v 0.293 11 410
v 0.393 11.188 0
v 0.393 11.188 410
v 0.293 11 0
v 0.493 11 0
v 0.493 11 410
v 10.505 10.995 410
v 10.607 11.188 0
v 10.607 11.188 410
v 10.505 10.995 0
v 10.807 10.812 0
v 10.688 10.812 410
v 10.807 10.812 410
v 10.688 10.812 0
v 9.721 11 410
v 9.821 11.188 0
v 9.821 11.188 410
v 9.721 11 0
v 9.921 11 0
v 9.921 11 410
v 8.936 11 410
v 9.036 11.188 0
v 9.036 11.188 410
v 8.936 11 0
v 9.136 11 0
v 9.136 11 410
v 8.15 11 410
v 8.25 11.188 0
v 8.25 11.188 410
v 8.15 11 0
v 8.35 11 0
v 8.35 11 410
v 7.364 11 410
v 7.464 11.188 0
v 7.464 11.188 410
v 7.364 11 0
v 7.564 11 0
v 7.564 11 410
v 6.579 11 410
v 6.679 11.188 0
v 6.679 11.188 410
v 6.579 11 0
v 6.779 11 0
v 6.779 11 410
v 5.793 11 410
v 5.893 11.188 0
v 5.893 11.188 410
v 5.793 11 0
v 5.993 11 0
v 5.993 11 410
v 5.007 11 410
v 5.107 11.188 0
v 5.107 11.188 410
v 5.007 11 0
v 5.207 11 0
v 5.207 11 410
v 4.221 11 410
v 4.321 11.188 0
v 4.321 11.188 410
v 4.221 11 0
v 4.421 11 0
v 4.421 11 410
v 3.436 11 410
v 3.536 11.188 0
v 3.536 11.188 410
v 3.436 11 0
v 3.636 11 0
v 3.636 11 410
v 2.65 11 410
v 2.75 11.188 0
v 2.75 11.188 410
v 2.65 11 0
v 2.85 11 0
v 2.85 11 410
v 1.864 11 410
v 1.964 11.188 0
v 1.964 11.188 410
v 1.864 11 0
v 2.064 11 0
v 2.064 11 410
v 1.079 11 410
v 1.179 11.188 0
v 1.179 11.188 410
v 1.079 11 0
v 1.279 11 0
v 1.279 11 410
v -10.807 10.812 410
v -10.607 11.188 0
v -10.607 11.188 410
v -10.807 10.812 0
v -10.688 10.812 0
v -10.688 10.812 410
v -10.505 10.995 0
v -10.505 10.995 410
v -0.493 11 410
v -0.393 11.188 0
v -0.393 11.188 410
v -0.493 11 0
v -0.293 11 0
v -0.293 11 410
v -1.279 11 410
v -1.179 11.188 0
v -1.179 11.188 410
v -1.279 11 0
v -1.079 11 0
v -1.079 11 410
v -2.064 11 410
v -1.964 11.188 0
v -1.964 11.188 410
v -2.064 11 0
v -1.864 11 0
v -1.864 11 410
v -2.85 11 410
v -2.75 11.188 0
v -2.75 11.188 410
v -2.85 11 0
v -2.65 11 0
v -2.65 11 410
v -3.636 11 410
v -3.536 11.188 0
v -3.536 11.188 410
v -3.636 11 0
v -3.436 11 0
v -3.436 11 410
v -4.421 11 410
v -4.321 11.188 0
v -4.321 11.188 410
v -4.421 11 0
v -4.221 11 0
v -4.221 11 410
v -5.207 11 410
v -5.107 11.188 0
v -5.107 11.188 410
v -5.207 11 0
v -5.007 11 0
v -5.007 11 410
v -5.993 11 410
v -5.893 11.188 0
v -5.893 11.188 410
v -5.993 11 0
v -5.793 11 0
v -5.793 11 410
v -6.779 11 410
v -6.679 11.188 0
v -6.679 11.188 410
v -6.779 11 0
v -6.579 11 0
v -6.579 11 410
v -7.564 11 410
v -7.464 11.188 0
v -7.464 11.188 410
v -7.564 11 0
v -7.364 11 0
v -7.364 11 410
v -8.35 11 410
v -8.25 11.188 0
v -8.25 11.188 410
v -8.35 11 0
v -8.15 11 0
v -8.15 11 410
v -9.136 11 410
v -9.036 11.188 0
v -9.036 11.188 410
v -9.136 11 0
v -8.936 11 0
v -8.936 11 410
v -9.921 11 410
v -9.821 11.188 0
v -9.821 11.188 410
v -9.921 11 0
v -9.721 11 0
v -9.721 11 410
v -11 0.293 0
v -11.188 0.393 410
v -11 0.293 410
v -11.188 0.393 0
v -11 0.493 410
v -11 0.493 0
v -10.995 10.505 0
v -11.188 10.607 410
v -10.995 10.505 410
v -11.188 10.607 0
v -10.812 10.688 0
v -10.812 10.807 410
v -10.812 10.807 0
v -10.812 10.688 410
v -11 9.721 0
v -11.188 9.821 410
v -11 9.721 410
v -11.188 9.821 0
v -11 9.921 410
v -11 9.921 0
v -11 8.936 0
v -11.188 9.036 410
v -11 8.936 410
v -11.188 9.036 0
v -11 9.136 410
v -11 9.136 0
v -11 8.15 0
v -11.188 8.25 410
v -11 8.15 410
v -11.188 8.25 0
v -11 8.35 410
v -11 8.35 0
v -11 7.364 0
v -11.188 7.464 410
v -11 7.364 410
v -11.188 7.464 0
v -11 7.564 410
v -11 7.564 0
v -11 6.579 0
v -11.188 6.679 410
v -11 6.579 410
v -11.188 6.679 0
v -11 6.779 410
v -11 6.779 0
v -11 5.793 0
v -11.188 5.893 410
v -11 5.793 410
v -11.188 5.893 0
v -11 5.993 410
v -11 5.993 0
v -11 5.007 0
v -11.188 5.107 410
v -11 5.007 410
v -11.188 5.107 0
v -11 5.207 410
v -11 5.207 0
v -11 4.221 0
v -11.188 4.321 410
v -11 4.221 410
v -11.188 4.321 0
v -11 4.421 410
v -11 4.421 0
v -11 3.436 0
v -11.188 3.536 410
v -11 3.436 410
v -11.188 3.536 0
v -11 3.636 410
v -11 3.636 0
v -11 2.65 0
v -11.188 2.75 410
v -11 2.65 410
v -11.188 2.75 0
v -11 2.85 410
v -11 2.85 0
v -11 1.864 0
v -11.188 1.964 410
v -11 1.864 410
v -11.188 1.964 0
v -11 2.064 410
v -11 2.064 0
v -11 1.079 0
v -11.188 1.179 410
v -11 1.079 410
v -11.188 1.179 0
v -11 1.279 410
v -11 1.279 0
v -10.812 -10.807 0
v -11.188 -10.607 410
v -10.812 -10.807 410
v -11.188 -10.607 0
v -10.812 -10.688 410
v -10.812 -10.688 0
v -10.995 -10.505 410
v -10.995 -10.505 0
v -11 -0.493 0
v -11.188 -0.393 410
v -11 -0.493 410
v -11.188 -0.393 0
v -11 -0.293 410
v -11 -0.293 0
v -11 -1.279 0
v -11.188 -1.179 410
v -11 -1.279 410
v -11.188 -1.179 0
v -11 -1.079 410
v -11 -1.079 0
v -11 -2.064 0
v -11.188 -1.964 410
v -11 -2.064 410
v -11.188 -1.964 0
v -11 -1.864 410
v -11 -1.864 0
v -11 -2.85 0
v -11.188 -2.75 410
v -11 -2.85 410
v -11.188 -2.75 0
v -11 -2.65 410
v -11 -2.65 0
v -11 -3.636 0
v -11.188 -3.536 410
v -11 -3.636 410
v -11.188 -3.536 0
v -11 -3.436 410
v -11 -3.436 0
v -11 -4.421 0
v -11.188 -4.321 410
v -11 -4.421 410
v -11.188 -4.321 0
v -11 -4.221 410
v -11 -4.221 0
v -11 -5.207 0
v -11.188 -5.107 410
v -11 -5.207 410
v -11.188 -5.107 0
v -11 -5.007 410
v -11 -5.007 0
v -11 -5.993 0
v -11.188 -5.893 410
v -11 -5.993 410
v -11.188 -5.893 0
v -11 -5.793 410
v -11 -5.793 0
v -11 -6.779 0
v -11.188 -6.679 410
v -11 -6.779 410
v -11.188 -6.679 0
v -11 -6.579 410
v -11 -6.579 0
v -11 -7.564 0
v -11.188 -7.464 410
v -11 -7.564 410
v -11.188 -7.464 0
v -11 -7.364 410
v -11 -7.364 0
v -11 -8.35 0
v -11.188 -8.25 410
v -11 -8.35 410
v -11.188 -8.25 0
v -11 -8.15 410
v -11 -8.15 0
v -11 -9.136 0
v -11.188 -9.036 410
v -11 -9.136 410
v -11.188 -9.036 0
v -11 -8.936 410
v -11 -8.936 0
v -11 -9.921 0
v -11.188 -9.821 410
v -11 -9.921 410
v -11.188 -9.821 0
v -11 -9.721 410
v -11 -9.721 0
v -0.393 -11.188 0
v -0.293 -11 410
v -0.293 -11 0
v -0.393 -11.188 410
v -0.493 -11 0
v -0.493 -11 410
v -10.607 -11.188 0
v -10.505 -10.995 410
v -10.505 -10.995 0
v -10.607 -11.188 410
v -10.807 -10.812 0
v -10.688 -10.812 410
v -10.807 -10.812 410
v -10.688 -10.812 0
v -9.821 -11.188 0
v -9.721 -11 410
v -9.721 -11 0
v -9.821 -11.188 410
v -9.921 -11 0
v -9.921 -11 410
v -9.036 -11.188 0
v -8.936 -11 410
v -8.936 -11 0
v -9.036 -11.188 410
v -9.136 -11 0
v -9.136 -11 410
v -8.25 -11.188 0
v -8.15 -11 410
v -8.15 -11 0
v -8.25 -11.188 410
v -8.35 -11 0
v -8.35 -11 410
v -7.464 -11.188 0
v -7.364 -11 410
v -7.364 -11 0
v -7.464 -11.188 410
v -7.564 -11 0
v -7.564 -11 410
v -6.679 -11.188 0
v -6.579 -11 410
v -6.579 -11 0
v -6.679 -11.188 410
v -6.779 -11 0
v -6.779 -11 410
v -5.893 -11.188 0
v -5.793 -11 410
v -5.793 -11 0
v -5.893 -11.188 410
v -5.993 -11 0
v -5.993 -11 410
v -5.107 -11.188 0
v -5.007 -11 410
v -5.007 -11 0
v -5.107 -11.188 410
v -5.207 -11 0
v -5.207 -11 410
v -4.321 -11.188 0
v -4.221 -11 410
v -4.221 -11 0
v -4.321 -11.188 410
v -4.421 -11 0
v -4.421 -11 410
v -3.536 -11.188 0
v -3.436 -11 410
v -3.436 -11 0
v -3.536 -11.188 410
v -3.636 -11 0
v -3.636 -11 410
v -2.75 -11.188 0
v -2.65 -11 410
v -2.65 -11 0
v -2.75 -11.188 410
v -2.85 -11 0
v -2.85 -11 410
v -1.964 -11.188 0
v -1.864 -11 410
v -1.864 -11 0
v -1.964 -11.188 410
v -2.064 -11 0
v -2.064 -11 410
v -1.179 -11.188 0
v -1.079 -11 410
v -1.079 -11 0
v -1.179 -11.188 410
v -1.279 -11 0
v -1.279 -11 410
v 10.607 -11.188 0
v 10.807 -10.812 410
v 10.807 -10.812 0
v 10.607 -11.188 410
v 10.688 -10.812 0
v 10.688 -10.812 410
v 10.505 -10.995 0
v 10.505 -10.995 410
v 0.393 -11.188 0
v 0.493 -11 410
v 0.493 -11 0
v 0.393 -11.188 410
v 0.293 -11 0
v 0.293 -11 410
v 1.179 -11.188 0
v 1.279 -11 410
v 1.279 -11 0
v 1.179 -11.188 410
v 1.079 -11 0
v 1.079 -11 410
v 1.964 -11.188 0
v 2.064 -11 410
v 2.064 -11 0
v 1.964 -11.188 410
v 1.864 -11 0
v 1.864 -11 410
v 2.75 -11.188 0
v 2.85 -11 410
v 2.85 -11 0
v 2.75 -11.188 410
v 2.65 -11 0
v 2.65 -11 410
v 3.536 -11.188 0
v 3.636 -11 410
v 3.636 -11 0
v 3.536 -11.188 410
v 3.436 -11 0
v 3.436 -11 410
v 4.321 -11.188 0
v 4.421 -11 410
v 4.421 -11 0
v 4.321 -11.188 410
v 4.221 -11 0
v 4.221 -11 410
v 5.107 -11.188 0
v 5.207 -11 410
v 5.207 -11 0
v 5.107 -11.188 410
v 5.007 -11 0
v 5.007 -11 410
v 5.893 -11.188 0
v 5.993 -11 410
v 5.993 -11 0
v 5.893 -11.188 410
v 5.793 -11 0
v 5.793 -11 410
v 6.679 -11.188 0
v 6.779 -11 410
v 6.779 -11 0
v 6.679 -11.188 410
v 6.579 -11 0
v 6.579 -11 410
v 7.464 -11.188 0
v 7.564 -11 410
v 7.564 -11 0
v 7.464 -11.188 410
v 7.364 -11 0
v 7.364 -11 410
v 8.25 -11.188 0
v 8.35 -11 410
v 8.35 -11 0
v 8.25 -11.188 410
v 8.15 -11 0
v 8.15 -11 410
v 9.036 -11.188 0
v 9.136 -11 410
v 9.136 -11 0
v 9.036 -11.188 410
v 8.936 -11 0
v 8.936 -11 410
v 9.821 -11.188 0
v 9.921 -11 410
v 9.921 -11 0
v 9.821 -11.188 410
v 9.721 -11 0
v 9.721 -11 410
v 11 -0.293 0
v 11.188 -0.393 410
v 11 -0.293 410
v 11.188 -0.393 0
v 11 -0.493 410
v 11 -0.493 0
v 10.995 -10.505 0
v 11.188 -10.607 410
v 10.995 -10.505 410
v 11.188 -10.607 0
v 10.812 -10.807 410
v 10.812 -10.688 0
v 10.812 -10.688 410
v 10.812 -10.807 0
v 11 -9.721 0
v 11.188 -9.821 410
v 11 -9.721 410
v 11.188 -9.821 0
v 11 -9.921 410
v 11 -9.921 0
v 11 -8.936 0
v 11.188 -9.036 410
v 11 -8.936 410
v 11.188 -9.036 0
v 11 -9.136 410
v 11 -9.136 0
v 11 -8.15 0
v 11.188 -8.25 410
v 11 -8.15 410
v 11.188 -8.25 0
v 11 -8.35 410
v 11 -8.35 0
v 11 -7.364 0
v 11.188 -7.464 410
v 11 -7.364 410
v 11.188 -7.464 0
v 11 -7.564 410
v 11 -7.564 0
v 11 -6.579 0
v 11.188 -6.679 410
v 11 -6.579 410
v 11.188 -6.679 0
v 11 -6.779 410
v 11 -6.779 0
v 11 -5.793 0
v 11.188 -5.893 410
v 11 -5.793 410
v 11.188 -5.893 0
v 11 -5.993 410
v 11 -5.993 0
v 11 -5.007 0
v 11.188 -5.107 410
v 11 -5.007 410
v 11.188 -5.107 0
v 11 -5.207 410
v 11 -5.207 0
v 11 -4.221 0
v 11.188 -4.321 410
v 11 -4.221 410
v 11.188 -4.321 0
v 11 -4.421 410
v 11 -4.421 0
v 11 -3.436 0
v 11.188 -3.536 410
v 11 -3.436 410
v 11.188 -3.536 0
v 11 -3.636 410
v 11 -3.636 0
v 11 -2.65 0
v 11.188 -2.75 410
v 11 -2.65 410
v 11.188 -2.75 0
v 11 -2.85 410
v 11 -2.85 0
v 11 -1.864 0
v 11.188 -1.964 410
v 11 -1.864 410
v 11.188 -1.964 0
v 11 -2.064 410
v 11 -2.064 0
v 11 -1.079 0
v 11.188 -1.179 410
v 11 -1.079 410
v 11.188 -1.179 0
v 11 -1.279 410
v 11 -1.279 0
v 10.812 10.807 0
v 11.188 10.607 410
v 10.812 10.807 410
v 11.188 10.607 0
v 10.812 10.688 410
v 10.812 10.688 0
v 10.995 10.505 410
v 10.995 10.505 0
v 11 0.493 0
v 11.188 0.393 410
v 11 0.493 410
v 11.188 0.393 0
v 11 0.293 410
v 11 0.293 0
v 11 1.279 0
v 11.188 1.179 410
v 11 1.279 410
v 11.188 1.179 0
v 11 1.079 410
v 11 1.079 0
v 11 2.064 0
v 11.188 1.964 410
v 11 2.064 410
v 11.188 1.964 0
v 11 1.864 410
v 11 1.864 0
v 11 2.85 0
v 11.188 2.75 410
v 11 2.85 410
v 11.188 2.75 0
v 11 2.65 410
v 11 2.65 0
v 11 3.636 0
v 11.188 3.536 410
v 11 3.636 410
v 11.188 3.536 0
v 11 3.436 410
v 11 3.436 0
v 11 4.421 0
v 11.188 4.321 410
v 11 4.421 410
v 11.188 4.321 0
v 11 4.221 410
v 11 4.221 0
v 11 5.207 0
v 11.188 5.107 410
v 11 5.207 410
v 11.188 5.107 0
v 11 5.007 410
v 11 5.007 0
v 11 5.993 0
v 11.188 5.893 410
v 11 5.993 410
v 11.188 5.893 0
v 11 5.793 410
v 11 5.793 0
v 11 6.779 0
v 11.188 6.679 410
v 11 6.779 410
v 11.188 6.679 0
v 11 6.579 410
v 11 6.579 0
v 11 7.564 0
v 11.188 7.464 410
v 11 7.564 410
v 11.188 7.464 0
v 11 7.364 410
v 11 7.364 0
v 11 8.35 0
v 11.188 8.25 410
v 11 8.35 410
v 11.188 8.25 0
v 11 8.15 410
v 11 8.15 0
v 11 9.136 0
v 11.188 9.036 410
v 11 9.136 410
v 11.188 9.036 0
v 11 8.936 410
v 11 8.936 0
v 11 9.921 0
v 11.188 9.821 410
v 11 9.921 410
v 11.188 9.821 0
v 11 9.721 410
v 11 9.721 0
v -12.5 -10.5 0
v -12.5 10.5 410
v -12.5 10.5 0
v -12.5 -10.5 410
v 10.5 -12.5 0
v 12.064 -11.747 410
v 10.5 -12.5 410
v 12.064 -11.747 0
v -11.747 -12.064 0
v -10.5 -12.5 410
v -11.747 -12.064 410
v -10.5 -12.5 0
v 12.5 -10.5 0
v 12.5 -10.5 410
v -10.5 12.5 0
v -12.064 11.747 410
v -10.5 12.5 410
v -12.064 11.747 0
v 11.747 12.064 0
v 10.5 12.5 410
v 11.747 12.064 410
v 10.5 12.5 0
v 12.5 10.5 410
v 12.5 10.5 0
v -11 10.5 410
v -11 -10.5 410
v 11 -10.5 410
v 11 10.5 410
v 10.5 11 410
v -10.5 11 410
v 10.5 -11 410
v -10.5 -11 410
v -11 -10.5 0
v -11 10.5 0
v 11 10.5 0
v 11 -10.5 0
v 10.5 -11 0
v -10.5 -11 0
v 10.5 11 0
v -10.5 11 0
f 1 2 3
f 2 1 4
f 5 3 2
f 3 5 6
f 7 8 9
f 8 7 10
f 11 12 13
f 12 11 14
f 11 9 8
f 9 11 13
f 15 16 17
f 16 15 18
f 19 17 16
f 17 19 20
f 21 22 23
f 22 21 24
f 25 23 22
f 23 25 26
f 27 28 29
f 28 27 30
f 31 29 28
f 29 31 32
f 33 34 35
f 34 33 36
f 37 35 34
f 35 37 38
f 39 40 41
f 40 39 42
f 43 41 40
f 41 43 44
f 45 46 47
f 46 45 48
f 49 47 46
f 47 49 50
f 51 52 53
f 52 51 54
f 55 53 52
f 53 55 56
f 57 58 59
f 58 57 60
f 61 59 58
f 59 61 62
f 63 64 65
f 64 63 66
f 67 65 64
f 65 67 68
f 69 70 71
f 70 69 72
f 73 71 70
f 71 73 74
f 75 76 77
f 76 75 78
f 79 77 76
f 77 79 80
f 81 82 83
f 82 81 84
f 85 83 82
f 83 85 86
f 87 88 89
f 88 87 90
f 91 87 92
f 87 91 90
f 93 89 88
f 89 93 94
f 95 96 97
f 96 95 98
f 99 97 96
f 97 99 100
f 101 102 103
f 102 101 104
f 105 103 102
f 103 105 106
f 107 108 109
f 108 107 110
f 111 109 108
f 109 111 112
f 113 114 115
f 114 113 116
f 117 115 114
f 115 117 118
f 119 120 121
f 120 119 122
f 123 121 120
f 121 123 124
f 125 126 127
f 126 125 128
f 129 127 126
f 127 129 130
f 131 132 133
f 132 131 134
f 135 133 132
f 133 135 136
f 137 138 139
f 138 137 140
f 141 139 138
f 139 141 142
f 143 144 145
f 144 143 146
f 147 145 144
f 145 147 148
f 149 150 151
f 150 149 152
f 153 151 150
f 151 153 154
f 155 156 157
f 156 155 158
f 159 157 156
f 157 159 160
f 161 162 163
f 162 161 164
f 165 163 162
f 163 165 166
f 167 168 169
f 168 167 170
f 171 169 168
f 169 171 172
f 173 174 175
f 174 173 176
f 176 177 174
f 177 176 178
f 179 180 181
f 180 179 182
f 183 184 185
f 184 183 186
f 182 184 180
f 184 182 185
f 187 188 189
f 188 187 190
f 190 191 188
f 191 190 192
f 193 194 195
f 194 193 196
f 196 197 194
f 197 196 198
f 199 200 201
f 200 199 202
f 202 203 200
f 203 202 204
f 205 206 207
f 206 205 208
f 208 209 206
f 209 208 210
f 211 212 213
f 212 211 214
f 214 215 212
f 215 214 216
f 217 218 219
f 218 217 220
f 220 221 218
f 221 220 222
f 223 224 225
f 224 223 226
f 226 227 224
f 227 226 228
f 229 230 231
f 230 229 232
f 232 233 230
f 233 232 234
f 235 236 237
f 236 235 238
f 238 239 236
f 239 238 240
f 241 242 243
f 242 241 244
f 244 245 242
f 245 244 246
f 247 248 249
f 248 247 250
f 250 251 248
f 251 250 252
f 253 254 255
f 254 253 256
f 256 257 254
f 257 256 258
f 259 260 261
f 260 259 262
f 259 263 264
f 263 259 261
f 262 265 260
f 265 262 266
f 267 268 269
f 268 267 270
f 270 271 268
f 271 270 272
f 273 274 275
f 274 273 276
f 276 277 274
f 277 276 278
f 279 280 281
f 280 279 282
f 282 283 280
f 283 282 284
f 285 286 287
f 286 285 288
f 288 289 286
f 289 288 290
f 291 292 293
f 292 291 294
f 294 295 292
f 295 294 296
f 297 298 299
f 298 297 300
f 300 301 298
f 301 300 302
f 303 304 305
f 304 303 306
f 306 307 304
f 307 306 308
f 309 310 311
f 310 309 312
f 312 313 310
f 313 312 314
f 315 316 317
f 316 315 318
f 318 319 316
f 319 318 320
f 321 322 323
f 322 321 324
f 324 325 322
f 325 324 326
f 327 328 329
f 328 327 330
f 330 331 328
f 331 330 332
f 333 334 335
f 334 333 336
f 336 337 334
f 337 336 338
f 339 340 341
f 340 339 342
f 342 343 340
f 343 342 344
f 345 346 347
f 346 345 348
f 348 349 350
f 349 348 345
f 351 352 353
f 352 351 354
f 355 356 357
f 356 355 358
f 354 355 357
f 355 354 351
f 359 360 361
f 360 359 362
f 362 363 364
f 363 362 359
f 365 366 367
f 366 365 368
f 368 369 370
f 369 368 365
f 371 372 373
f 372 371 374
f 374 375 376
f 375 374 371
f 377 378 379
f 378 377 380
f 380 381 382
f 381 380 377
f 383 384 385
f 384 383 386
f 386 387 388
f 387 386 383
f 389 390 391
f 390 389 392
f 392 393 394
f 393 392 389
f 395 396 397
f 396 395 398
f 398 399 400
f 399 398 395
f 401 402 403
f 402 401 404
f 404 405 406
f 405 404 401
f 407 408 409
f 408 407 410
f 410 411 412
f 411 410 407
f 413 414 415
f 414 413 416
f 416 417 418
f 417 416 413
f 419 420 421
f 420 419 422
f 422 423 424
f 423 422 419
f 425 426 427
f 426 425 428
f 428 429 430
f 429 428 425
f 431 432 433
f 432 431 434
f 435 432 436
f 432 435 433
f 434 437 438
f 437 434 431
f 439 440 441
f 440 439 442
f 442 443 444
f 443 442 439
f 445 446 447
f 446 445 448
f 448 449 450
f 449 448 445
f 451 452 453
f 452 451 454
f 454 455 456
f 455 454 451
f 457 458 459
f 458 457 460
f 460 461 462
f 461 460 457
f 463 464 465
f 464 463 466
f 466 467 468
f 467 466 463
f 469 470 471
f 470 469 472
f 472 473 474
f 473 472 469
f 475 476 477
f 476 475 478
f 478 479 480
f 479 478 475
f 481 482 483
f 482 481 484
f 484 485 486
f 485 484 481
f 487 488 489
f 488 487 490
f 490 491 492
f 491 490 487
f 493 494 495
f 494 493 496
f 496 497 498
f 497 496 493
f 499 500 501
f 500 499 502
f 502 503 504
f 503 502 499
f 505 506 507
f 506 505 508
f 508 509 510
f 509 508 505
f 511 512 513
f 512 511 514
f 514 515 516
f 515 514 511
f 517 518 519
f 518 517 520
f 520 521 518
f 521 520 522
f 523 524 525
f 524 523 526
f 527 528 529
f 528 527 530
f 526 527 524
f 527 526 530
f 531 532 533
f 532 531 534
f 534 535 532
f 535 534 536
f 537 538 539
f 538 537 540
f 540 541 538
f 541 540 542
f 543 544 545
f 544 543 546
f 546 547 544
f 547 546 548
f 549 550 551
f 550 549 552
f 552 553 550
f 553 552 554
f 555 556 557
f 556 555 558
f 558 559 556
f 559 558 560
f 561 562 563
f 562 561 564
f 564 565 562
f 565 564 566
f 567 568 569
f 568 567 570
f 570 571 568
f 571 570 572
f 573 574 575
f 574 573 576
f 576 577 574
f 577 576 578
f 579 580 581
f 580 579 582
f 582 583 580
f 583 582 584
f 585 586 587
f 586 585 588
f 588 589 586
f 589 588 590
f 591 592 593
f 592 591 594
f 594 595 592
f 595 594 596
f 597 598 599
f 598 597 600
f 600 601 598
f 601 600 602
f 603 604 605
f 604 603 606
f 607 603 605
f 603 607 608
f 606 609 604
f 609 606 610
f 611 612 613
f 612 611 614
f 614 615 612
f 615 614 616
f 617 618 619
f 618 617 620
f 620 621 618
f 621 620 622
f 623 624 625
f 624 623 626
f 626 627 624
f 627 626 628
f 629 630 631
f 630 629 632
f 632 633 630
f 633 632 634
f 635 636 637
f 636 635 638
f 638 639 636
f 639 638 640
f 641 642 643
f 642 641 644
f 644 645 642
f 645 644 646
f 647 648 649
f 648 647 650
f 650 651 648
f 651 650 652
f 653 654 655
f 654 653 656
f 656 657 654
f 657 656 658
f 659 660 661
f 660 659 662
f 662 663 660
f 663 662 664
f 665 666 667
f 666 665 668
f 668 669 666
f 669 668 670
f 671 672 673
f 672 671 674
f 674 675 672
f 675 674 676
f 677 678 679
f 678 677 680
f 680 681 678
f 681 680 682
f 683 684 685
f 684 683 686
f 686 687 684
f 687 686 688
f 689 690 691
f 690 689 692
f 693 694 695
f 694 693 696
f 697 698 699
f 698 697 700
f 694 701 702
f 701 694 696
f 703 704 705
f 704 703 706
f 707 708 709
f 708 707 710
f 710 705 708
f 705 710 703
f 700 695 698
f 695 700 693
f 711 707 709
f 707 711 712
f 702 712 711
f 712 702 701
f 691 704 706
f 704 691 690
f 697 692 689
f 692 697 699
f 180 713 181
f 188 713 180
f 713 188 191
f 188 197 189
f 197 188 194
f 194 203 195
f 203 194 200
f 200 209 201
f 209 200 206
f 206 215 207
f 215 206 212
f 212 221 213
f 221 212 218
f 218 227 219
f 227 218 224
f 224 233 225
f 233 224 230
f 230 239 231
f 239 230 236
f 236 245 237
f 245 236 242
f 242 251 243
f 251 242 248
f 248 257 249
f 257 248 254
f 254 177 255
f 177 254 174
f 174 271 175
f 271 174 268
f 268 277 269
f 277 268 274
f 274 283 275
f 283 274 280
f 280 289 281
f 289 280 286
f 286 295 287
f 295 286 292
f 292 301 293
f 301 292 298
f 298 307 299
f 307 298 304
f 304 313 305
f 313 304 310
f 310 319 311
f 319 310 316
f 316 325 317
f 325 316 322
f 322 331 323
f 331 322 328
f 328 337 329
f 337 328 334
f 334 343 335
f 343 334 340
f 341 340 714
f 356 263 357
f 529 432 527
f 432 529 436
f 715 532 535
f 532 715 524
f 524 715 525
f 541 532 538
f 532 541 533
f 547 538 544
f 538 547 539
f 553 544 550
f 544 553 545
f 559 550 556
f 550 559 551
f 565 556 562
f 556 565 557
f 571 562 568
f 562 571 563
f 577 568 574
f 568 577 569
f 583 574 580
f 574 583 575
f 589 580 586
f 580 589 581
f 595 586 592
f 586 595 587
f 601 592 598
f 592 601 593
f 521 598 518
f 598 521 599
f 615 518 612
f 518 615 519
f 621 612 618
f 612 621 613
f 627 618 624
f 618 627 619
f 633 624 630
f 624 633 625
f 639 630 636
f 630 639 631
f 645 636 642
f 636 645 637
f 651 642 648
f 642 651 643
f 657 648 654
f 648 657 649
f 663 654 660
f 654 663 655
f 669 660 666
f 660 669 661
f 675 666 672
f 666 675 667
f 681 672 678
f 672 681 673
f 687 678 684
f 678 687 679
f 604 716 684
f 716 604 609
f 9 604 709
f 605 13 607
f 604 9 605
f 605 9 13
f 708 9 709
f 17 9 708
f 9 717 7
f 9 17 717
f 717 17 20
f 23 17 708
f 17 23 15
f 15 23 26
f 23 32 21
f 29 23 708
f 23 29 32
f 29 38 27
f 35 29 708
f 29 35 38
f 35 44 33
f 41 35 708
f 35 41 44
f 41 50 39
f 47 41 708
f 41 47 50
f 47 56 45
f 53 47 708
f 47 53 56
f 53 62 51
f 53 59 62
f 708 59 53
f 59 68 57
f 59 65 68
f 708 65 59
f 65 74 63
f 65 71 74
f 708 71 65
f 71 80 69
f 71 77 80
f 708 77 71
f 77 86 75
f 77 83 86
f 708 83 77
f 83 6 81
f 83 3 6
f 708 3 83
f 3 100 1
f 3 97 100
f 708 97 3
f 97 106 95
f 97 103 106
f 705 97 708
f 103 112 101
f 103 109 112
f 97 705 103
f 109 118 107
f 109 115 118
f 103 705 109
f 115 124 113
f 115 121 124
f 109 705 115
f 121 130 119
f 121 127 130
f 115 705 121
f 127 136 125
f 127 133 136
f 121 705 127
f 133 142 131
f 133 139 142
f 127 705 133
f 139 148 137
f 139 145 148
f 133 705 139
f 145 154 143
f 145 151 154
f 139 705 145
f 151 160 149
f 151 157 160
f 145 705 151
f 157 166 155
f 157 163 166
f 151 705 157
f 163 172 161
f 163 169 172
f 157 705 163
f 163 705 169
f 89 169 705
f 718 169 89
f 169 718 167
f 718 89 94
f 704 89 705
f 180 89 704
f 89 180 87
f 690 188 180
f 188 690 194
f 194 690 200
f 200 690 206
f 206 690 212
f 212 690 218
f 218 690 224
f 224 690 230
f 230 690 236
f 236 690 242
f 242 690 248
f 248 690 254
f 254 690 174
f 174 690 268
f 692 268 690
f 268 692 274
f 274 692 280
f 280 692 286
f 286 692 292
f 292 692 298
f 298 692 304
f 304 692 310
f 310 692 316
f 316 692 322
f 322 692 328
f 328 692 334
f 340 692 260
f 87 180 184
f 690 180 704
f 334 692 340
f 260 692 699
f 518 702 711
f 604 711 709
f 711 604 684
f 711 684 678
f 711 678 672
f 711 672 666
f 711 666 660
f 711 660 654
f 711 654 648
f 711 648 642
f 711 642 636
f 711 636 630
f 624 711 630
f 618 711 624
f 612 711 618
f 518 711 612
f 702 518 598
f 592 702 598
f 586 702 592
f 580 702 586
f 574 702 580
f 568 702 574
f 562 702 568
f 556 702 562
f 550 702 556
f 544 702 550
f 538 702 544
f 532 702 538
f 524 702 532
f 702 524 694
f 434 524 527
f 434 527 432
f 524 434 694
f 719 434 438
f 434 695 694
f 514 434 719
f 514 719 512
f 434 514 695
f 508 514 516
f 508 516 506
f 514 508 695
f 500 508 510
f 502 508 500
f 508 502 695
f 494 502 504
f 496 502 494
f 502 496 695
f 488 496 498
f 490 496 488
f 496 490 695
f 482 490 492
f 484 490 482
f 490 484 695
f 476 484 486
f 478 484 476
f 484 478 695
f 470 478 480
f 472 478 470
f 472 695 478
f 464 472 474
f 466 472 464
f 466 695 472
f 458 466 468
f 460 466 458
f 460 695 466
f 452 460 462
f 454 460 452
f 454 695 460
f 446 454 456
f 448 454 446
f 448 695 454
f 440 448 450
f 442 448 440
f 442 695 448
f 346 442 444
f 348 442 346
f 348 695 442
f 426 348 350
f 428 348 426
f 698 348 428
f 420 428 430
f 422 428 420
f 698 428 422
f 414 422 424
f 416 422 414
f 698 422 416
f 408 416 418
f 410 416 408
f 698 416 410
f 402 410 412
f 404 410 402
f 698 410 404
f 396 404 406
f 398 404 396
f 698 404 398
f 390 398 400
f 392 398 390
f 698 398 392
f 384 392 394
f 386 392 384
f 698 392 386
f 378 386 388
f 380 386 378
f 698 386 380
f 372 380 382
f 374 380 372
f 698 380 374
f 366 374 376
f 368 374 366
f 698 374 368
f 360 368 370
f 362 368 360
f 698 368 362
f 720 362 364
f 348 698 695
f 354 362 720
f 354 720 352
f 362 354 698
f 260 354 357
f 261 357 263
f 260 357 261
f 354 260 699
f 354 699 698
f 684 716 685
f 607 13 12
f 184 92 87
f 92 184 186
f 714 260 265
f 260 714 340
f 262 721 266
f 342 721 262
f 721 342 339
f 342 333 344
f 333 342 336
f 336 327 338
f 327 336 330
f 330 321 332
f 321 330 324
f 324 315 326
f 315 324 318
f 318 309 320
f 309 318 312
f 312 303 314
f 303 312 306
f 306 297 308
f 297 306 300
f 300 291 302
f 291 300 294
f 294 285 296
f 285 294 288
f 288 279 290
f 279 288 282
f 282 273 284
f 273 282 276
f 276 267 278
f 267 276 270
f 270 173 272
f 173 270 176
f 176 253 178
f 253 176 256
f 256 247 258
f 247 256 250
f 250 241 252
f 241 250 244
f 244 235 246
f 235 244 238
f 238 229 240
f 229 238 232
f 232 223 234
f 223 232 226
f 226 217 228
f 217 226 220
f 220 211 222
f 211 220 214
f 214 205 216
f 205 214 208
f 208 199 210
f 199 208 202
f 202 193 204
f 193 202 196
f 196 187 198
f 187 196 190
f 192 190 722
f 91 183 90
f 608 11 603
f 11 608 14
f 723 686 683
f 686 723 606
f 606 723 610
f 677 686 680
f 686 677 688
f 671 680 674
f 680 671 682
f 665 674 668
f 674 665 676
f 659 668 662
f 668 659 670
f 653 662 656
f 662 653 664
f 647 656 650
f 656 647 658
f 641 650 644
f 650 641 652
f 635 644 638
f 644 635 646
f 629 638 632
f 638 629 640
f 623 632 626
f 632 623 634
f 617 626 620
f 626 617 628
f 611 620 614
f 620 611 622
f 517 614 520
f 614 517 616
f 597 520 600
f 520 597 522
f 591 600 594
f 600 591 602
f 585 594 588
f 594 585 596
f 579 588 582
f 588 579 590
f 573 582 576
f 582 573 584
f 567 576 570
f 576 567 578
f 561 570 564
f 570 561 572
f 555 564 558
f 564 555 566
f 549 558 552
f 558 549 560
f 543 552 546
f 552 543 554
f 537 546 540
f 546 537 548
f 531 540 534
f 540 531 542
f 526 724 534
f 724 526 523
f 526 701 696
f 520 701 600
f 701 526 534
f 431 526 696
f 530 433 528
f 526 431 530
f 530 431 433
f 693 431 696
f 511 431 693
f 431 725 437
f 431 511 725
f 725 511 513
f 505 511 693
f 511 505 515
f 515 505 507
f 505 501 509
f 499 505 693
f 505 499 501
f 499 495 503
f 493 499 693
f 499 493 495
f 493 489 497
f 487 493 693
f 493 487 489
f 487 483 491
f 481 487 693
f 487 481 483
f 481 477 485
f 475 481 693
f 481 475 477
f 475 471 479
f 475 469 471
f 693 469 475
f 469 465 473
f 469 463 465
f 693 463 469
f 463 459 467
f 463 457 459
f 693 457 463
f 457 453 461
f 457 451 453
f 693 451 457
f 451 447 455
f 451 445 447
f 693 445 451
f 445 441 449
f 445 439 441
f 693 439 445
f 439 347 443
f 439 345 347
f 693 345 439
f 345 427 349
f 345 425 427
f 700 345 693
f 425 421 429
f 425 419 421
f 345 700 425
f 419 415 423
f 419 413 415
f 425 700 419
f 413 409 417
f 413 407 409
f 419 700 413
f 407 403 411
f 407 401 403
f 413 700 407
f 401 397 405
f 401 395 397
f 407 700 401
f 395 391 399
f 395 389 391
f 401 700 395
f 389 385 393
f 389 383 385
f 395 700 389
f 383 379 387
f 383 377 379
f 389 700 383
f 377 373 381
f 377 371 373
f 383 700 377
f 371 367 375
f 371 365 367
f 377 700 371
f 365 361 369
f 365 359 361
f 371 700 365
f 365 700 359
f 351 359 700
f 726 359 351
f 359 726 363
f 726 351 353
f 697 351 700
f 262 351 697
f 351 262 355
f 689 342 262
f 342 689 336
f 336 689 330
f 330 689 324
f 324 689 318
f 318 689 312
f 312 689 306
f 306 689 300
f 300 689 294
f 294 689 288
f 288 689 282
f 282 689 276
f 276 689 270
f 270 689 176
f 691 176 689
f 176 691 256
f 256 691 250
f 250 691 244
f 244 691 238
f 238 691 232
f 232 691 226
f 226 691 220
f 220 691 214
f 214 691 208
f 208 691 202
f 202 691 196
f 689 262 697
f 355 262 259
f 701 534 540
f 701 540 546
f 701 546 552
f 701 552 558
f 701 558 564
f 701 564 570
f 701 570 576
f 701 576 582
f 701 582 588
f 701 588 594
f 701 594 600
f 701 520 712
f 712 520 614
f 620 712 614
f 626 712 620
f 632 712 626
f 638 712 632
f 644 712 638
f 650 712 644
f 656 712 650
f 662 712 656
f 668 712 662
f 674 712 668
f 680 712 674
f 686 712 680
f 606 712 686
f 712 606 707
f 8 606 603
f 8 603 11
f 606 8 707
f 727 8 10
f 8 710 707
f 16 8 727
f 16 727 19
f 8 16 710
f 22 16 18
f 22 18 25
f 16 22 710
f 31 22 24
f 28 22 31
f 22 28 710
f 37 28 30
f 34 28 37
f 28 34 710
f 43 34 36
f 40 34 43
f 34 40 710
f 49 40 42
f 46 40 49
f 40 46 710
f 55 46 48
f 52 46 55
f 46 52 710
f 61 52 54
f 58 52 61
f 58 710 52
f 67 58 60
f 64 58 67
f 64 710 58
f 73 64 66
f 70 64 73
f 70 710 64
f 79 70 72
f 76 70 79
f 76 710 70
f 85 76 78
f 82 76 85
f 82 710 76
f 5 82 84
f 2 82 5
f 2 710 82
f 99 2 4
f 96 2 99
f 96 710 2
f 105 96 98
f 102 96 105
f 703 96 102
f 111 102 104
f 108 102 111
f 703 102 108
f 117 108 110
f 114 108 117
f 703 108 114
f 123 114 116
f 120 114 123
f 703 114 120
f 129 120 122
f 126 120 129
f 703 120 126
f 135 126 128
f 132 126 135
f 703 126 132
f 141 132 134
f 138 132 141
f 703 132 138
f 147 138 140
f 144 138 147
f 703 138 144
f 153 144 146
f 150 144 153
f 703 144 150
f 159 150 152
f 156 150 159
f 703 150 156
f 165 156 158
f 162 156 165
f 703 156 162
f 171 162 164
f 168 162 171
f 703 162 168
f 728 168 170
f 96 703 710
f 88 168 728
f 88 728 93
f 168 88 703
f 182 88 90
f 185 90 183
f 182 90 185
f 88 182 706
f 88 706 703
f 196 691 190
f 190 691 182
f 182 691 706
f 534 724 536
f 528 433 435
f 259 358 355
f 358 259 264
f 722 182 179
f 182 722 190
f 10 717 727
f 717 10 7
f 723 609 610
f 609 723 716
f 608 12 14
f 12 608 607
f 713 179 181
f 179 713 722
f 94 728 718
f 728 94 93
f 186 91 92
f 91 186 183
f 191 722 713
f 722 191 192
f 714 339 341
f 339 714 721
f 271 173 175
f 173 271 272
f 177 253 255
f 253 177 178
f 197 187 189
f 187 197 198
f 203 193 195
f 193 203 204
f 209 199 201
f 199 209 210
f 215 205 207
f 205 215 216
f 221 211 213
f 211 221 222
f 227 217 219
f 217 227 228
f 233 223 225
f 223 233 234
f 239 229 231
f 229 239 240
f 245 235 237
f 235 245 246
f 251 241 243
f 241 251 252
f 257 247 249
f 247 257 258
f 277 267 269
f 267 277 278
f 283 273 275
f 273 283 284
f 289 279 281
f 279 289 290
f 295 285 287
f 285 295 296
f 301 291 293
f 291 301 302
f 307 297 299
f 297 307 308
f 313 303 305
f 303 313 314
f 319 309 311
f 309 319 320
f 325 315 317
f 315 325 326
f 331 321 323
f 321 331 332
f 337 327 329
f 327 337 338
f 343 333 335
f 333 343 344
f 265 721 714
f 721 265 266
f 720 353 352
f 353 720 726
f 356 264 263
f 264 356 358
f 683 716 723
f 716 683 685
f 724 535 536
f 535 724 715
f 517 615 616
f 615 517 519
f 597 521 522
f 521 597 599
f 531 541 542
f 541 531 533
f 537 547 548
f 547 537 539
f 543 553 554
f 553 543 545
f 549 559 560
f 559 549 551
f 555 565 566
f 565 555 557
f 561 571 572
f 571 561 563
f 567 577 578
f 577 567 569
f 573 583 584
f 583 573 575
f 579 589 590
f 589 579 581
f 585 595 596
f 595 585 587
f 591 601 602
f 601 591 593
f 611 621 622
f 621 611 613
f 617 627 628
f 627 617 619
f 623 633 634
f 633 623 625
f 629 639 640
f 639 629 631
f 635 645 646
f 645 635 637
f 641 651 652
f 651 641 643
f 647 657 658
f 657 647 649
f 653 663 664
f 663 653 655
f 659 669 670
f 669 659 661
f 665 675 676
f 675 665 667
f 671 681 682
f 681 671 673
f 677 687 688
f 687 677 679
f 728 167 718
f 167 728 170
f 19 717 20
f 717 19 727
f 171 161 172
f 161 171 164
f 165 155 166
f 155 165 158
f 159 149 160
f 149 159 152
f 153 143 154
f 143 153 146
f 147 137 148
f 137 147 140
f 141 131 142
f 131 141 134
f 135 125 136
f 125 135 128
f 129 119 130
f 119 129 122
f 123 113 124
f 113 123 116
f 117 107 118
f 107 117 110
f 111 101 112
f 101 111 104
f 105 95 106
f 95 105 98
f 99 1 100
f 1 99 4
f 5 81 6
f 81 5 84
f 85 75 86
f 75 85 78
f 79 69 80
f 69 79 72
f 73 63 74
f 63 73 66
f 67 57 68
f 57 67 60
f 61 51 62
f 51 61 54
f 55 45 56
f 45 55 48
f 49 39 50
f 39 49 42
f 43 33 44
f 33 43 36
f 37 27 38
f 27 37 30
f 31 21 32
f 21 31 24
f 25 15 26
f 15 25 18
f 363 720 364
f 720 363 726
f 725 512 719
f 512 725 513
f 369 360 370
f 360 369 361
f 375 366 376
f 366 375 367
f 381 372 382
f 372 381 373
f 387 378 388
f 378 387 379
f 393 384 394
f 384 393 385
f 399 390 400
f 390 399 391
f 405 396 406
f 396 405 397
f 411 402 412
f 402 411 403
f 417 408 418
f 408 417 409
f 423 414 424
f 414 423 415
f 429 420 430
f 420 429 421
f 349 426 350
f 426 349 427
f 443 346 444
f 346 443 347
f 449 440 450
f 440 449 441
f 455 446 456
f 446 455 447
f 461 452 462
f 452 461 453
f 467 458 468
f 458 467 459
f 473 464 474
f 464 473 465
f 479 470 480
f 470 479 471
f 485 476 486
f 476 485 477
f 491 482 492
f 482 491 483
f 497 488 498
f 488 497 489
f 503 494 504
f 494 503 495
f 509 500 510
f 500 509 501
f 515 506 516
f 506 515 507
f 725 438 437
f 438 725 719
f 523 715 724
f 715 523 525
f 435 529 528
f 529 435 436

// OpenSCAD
// ============================================================
//  ALUSTECK® Komplettbibliothek – 25 × 25 mm System
//
//  Teile:
//    0  vierkantrohr()           – Rohr (Länge frei wählbar)
//    1  rechter_winkel()         – L-Form,  2 Zapfen (2D)
//    2  t_stueck()               – T-Form,  3 Zapfen (2D)
//    3  kreuz()                  – +-Form,  4 Zapfen (2D)
//    4  rechter_winkel_abgang()  – 3D-Ecke, 3 Zapfen
//    5  t_verbinder_abgang()     – 3D-T+1,  4 Zapfen
//    6  kreuz_abgang()           – Kreuz+1, 5 Zapfen (3D)
//    7  stern()                  – Alle 6 Seiten, 6 Zapfen (3D)
//    8  rohrverlaengerung()      – Gerade Verlängerung, 2 Zapfen
//
//  Koordinatensystem des Knotens:
//    Querschnitt zentriert in XY, Extrusion in +Z (0 → hub_s)
//    +X-Fläche bei x=+hub_s/2,  -X bei x=-hub_s/2
//    +Y-Fläche bei y=+hub_s/2,  -Y bei y=-hub_s/2
//    +Z-Fläche bei z=hub_s,     -Z bei z=0
//
//  Rotationen (geprüft – Zapfen wächst in +Z, wird auf Achse gedreht):
//    +X: rotate([  0, 90, 0])  →  z→+x
//    -X: rotate([  0,-90, 0])  →  z→-x
//    +Y: rotate([-90,  0, 0])  →  z→+y
//    -Y: rotate([ 90,  0, 0])  →  z→-y
//    +Z: kein rotate            →  z→+z
//    -Z: rotate([180,  0, 0])  →  z→-z
// ============================================================

/* [Anzeige] */
anzeige = 0; // [0:Vierkantrohr, 1:Rechter Winkel, 2:T-Stück, 3:Kreuz, 4:Rechter Winkel 3D, 5:T-Verbinder 3D, 6:Kreuz mit Abgang, 7:Stern, 8:Rohrverlängerung]

/* [Rohr] */
rohr_laenge      = 410;
rohr_innenrillen = true;
rillen_anz       = 28;
rillentiefe      = 0.25;
rillenbreite     = 0.4;

/* [Gemeinsame Maße] */
rohr_aussen   = 25.0;
wandstaerke_r = 1.5;
ecken_r_rohr  = 2.0;

/* [Verbinder-Maße] */
zapfen_laenge = 49.0;
spiel         = 0.15;
wandstaerke_v = 1.8;
ecken_r_v     = 1.6;

/* [Rippen] */
rippen_an  = true;
rippen_anz = 5;
rippen_h   = 0.5;
rippen_b   = 1.0;

// ============================================================
//  Abgeleitete Werte
// ============================================================
rohr_innen   = rohr_aussen - 2 * wandstaerke_r;
innen_r_rohr = max(0.1, ecken_r_rohr - wandstaerke_r);

zapfen_s = rohr_aussen - 2 * spiel;
innen_s  = zapfen_s - 2 * wandstaerke_v;
hub_s    = rohr_aussen;

// ============================================================
//  Hilfsmakro: abgerundetes Quadrat (2D), zentriert
// ============================================================
module sq(s, r) {
    offset(r = r) square(s - 2*r, center = true);
}

// ============================================================
//  VIERKANTROHR
// ============================================================
module vierkantrohr(l = rohr_laenge) {
    difference() {
        linear_extrude(l) sq(rohr_aussen, ecken_r_rohr);
        translate([0, 0, -0.01])
        linear_extrude(l + 0.02)
            sq(rohr_innen, innen_r_rohr);
        if (rohr_innenrillen) {
            for (seite = [0:3]) {
                rotate([0, 0, seite * 90])
                translate([0, 0, -0.01])
                linear_extrude(l + 0.02)
                    rohr_rillen_2d();
            }
        }
    }
}

module rohr_rillen_2d() {
    rasterb = rohr_innen / rillen_anz;
    for (i = [0 : rillen_anz - 1]) {
        x = -rohr_innen/2 + i * rasterb + rasterb/2;
        translate([x, rohr_innen/2 - rillentiefe * 0.75])
        polygon([
            [-rillenbreite/2,  0],
            [ rillenbreite/2,  0],
            [ 0,               rillentiefe * 1.5]
        ]);
    }
}

// ============================================================
//  ZAPFEN
//  Wächst in +Z ab Ursprung, Querschnitt zentriert in XY.
//  Rippen auf allen 4 Außenflächen.
// ============================================================
module zapfen(l = zapfen_laenge) {
    z0  = l * 0.12;
    zl  = l * 0.70;
    nb  = zapfen_s * 0.72;
    gap = (rippen_anz > 1) ? nb / (rippen_anz - 1) : 0;
    h   = rippen_h;
    b   = rippen_b;
    s   = zapfen_s;

    union() {
        // Hohlkörper
        difference() {
            linear_extrude(l) sq(s, ecken_r_v);
            translate([0, 0, -0.01])
            linear_extrude(l + 0.02)
                sq(innen_s, max(0.1, ecken_r_v - wandstaerke_v));
        }

        // Rippen ±Y (über X verteilt)
        for (i = [0 : rippen_anz - 1]) {
            x = -nb/2 + i * gap;
            translate([x,  s/2,       z0 + zl/2]) cube([b, h, zl], center=true);
            translate([x, -s/2 - h/2, z0 + zl/2]) cube([b, h, zl], center=true);
        }

        // Rippen ±X (über Y verteilt)
        for (i = [0 : rippen_anz - 1]) {
            y = -nb/2 + i * gap;
            translate([ s/2,       y, z0 + zl/2]) cube([h, b, zl], center=true);
            translate([-s/2 - h/2, y, z0 + zl/2]) cube([h, b, zl], center=true);
        }
    }
}

// ============================================================
//  KNOTEN
// ============================================================
module knoten() {
    linear_extrude(hub_s) sq(hub_s, ecken_r_v);
}

// ============================================================
//  zapfen_rot: dreht Zapfen (+Z) auf gewünschte Achse
//
//  Geprüfte Rotationsmatrix für rotate([a,b,c]) um Y-Achse:
//    rotate([0, 90,0]): (x,y,z)→( z, y,-x)  → z wächst in +X ✓
//    rotate([0,-90,0]): (x,y,z)→(-z, y, x)  → z wächst in -X ✓
//    rotate([-90,0,0]): (x,y,z)→( x, z,-y)  → z wächst in +Y ✓
//    rotate([ 90,0,0]): (x,y,z)→( x,-z, y)  → z wächst in -Y ✓
// ============================================================
module zapfen_rot(dir) {
    if      (dir == [ 1, 0, 0]) rotate([  0, 90, 0]) zapfen();
    else if (dir == [-1, 0, 0]) rotate([  0,-90, 0]) zapfen();
    else if (dir == [ 0, 1, 0]) rotate([-90,  0, 0]) zapfen();
    else if (dir == [ 0,-1, 0]) rotate([ 90,  0, 0]) zapfen();
    else if (dir == [ 0, 0, 1])                       zapfen();
    else if (dir == [ 0, 0,-1]) rotate([180,  0, 0]) zapfen();
}

// ============================================================
//  zapfen_an: Zapfen bündig an Knotenaußenfläche
//
//  Knotengeometrie (zentriert XY, +Z-Extrusion 0→hub_s):
//    Flächenmittelpunkte:
//      +X → ( hub_s/2,      0, hub_s/2)
//      -X → (-hub_s/2,      0, hub_s/2)
//      +Y → (       0,  hub_s/2, hub_s/2)
//      -Y → (       0, -hub_s/2, hub_s/2)
//      +Z → (       0,       0,  hub_s  )
//      -Z → (       0,       0,  0      )
//
//  Formel: pos = dir * hub_s/2 + [0, 0, hub_s/2]
// ============================================================
module zapfen_an(dir) {
    pos = dir * (hub_s/2) + [0, 0, hub_s/2];
    translate(pos) zapfen_rot(dir);
}

// ============================================================
//  VERBINDER
// ============================================================

module rechter_winkel() {
    knoten();
    zapfen_an([-1, 0, 0]);   // nach links  (-X)  ← Knoten sitzt in der Ecke
    zapfen_an([ 0, 0,-1]);   // nach unten  (-Z)
}

module t_stueck() {
    knoten();
    zapfen_an([ 1, 0, 0]);
    zapfen_an([-1, 0, 0]);
    zapfen_an([ 0, 0,-1]);
}

module kreuz() {
    knoten();
    zapfen_an([ 1, 0, 0]);
    zapfen_an([-1, 0, 0]);
    zapfen_an([ 0, 0, 1]);
    zapfen_an([ 0, 0,-1]);
}

module rechter_winkel_abgang() {
    knoten();
    zapfen_an([ 1, 0, 0]);
    zapfen_an([ 0, 0,-1]);
    zapfen_an([ 0, 1, 0]);
}

module t_verbinder_abgang() {
    knoten();
    zapfen_an([ 1, 0, 0]);
    zapfen_an([-1, 0, 0]);
    zapfen_an([ 0, 0,-1]);
    zapfen_an([ 0, 1, 0]);
}

// ============================================================
//  8. ROHRVERLÄNGERUNG  (gerade, 2 Zapfen gegenüber: +Z und -Z)
// ============================================================
module rohrverlaengerung() {
    knoten();
    zapfen_an([ 0, 0, 1]);
    zapfen_an([ 0, 0,-1]);
}

// ============================================================
//  RENDER  (Kreuz in XZ + 1 Zapfen nach +Y)
//     5 Zapfen: +X, -X, +Z, -Z, +Y
// ============================================================
module kreuz_abgang() {
    knoten();
    zapfen_an([ 1, 0, 0]);
    zapfen_an([-1, 0, 0]);
    zapfen_an([ 0, 0, 1]);
    zapfen_an([ 0, 0,-1]);
    zapfen_an([ 0, 1, 0]);
}

// ============================================================
//  7. STERN  (alle 6 Seiten belegt)
//     6 Zapfen: +X, -X, +Y, -Y, +Z, -Z
// ============================================================
module stern() {
    knoten();
    zapfen_an([ 1, 0, 0]);
    zapfen_an([-1, 0, 0]);
    zapfen_an([ 0, 1, 0]);
    zapfen_an([ 0,-1, 0]);
    zapfen_an([ 0, 0, 1]);
    zapfen_an([ 0, 0,-1]);
}

// ============================================================
//  RENDER
// ============================================================
if      (anzeige == 0) vierkantrohr(rohr_laenge);
else if (anzeige == 1) rechter_winkel();
else if (anzeige == 2) t_stueck();
else if (anzeige == 3) kreuz();
else if (anzeige == 4) rechter_winkel_abgang();
else if (anzeige == 5) t_verbinder_abgang();
else if (anzeige == 6) kreuz_abgang();
else if (anzeige == 7) stern();
else if (anzeige == 8) rohrverlaengerung();

// ============================================================
//  Alle Teile nebeneinander (zum Testen auskommentieren):
//
//  gap = 120;
//  vierkantrohr(200);
//  translate([gap,   0, 0]) rechter_winkel();
//  translate([gap*2, 0, 0]) t_stueck();
//  translate([gap*3, 0, 0]) kreuz();
//  translate([gap*4, 0, 0]) rechter_winkel_abgang();
//  translate([gap*5, 0, 0]) t_verbinder_abgang();
//  translate([gap*6, 0, 0]) kreuz_abgang();
//  translate([gap*7, 0, 0]) stern();
//  translate([gap*8, 0, 0]) rohrverlaengerung();
// ============================================================
